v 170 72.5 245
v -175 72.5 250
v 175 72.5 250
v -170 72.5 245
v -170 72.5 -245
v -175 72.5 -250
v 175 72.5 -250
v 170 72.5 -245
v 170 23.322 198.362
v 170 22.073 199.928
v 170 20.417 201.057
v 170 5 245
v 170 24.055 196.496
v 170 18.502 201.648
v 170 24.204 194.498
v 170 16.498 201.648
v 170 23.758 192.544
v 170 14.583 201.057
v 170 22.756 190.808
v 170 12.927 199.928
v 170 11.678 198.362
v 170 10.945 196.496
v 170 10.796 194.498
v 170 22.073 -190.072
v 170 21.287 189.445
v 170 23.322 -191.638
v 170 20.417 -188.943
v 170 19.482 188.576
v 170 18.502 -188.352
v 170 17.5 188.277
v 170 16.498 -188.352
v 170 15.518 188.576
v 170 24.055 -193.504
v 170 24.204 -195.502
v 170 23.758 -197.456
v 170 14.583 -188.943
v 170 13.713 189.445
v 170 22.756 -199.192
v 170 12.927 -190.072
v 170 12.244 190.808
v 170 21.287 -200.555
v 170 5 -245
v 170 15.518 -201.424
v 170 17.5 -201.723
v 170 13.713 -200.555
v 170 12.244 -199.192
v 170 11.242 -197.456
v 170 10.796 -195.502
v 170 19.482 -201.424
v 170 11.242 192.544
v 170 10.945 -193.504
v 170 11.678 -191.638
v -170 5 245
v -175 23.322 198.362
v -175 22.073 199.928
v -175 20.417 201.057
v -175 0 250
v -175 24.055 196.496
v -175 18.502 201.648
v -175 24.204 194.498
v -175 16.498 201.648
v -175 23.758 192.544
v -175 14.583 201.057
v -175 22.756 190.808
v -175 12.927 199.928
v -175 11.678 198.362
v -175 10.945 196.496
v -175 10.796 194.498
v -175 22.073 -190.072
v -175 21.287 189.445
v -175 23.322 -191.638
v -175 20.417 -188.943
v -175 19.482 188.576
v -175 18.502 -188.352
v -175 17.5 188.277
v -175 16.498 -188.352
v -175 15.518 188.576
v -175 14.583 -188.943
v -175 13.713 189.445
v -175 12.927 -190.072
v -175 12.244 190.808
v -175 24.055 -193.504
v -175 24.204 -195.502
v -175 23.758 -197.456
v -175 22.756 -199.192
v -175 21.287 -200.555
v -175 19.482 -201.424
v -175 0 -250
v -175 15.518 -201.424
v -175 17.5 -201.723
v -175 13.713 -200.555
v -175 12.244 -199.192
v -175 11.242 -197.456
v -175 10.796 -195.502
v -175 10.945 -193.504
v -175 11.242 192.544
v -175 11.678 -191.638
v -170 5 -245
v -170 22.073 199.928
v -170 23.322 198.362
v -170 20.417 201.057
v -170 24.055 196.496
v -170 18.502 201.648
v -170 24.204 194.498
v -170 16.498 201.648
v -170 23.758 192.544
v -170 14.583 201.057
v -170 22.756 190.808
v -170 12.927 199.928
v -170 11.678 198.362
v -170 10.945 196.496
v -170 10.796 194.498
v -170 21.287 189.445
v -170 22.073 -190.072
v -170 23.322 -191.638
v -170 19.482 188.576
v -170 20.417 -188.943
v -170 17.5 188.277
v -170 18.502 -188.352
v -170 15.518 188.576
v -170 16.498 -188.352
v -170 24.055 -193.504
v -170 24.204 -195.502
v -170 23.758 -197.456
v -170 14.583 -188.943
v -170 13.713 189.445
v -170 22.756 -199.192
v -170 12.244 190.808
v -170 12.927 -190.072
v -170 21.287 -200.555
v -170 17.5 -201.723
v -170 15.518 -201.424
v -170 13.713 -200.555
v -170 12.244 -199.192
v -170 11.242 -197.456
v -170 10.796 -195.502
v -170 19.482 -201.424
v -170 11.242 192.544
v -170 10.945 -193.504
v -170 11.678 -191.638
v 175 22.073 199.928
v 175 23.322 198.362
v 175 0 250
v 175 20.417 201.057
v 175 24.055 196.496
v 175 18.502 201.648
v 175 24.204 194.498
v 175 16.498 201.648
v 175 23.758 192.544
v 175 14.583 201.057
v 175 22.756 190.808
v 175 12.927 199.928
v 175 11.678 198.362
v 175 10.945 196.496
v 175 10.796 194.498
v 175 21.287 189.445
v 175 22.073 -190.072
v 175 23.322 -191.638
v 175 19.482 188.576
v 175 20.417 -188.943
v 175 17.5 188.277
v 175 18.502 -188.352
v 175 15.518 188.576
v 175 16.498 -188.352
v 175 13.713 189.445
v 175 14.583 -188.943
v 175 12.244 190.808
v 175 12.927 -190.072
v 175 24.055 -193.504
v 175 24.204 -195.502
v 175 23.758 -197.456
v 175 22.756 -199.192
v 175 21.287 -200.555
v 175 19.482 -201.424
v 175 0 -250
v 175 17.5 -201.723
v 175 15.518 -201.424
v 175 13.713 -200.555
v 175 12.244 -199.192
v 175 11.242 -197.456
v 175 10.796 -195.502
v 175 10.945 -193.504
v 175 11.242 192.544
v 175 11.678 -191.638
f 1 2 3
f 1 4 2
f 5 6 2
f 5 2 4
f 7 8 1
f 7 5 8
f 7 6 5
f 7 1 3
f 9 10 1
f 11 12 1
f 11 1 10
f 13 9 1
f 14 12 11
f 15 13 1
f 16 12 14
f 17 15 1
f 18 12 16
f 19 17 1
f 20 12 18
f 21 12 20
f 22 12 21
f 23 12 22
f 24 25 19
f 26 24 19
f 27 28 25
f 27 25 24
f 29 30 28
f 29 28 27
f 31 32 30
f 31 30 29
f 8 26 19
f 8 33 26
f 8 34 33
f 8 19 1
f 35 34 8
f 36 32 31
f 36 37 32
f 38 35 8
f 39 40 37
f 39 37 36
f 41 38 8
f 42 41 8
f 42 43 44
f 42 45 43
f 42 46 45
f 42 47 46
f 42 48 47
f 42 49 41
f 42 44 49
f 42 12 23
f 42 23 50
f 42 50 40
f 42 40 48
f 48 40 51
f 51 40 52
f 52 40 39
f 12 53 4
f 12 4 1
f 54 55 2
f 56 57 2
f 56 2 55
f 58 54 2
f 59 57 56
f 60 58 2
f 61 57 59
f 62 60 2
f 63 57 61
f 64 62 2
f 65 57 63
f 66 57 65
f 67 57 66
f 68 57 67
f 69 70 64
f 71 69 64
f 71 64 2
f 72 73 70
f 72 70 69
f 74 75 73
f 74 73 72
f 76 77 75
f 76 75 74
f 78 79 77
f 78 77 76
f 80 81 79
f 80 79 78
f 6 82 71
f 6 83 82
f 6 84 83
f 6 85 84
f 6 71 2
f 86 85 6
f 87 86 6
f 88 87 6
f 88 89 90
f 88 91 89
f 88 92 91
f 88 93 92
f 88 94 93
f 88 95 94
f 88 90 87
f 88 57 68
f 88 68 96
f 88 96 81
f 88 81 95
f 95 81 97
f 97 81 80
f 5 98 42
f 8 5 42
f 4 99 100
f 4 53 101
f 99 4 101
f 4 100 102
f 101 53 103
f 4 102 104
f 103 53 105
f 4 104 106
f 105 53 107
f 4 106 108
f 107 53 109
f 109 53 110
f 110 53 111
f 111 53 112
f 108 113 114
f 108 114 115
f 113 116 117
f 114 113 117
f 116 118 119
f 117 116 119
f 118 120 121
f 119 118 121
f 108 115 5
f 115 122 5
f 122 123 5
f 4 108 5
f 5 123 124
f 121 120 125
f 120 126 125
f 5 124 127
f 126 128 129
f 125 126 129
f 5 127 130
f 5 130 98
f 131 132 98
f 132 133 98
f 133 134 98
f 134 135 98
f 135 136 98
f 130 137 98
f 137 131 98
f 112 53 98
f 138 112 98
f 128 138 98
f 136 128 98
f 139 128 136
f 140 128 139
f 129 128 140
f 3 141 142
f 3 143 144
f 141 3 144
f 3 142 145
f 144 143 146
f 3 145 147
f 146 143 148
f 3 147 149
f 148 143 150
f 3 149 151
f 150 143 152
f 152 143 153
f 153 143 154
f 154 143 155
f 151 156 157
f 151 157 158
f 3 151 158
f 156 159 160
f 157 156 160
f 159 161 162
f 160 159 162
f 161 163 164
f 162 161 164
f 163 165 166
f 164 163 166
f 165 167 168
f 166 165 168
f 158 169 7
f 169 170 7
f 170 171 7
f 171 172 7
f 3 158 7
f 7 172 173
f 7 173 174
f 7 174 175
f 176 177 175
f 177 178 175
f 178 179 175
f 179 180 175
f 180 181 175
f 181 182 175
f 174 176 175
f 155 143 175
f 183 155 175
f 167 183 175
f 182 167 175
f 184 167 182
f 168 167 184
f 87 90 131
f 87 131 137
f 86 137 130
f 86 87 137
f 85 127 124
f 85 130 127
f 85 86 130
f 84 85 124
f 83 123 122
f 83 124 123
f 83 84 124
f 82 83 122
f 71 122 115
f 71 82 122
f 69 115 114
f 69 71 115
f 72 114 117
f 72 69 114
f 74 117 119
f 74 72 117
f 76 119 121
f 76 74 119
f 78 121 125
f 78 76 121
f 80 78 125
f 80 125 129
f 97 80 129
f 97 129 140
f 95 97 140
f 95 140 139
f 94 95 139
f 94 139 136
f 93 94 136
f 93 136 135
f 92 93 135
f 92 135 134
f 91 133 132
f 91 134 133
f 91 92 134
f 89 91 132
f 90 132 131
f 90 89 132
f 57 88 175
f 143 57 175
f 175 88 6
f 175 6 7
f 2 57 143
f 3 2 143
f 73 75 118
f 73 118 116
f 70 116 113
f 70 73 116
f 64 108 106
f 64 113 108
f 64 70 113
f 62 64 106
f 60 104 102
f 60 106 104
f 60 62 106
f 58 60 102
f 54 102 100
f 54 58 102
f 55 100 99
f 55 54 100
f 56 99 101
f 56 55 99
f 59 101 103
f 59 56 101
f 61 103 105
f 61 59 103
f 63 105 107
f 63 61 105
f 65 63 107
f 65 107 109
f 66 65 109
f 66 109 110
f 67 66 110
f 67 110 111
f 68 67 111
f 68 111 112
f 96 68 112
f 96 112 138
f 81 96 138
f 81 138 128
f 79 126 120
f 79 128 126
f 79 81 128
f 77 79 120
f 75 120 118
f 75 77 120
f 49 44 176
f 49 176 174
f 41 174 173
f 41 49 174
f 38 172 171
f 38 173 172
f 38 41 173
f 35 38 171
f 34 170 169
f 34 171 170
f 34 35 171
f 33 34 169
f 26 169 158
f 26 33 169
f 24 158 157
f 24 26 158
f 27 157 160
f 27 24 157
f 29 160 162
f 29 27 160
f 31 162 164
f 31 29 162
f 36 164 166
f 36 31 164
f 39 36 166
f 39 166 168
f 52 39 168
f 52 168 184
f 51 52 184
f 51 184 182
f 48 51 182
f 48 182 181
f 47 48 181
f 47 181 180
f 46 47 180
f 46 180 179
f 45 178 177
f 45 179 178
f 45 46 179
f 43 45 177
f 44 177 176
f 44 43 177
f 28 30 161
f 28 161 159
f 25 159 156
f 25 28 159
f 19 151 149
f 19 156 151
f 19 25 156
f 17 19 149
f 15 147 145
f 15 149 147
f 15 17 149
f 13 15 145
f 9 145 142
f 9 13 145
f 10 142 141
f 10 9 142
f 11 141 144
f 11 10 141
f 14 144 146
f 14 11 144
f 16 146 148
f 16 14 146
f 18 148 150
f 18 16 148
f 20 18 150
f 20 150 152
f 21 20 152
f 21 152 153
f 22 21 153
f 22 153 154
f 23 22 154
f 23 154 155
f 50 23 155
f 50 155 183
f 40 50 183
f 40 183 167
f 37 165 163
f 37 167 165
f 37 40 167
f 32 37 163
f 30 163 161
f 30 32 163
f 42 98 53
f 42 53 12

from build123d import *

# Parameters (mm, degrees)
SKETCH1_W               = 350
SKETCH1_H               = 500
BOSS_EXTRUDE1_DEPTH     = 72.5
SHELL1_T                = -5
CUT_EXTRUDE1_DEPTH      = 437.183734222
CUT_EXTRUDE1_DEPTH_BACK = 437.183734222
SKETCH2_R               = 6.723131081


with BuildPart() as part:
    # Sketch1 → Boss-Extrude1 (new body)
    with BuildSketch(Plane(origin=(0, 0, 0), x_dir=(1, 0, 0), z_dir=(0, 1, 0))):
        Rectangle(SKETCH1_W, SKETCH1_H)
    extrude(amount=BOSS_EXTRUDE1_DEPTH)

    # Shell1
    shell1_openings = [part.faces().sort_by_distance(p)[0] for p in [
        (0, 72.5, 0),
    ]]
    offset(amount=SHELL1_T, openings=shell1_openings, kind=Kind.INTERSECTION)

    # Sketch2 → Cut-Extrude1 (cut, two sides: drawn at the far end of the back side and taken through both)
    with BuildSketch(Plane(origin=(175, 0, 0), x_dir=(0, 0, -1), z_dir=(1, 0, 0)).offset(-CUT_EXTRUDE1_DEPTH_BACK)):
        with Locations((-195, 17.5)):
            Circle(SKETCH2_R)
        with Locations((195, 17.5)):
            Circle(SKETCH2_R)
    extrude(amount=CUT_EXTRUDE1_DEPTH + CUT_EXTRUDE1_DEPTH_BACK, mode=Mode.SUBTRACT)


solid = part.part
